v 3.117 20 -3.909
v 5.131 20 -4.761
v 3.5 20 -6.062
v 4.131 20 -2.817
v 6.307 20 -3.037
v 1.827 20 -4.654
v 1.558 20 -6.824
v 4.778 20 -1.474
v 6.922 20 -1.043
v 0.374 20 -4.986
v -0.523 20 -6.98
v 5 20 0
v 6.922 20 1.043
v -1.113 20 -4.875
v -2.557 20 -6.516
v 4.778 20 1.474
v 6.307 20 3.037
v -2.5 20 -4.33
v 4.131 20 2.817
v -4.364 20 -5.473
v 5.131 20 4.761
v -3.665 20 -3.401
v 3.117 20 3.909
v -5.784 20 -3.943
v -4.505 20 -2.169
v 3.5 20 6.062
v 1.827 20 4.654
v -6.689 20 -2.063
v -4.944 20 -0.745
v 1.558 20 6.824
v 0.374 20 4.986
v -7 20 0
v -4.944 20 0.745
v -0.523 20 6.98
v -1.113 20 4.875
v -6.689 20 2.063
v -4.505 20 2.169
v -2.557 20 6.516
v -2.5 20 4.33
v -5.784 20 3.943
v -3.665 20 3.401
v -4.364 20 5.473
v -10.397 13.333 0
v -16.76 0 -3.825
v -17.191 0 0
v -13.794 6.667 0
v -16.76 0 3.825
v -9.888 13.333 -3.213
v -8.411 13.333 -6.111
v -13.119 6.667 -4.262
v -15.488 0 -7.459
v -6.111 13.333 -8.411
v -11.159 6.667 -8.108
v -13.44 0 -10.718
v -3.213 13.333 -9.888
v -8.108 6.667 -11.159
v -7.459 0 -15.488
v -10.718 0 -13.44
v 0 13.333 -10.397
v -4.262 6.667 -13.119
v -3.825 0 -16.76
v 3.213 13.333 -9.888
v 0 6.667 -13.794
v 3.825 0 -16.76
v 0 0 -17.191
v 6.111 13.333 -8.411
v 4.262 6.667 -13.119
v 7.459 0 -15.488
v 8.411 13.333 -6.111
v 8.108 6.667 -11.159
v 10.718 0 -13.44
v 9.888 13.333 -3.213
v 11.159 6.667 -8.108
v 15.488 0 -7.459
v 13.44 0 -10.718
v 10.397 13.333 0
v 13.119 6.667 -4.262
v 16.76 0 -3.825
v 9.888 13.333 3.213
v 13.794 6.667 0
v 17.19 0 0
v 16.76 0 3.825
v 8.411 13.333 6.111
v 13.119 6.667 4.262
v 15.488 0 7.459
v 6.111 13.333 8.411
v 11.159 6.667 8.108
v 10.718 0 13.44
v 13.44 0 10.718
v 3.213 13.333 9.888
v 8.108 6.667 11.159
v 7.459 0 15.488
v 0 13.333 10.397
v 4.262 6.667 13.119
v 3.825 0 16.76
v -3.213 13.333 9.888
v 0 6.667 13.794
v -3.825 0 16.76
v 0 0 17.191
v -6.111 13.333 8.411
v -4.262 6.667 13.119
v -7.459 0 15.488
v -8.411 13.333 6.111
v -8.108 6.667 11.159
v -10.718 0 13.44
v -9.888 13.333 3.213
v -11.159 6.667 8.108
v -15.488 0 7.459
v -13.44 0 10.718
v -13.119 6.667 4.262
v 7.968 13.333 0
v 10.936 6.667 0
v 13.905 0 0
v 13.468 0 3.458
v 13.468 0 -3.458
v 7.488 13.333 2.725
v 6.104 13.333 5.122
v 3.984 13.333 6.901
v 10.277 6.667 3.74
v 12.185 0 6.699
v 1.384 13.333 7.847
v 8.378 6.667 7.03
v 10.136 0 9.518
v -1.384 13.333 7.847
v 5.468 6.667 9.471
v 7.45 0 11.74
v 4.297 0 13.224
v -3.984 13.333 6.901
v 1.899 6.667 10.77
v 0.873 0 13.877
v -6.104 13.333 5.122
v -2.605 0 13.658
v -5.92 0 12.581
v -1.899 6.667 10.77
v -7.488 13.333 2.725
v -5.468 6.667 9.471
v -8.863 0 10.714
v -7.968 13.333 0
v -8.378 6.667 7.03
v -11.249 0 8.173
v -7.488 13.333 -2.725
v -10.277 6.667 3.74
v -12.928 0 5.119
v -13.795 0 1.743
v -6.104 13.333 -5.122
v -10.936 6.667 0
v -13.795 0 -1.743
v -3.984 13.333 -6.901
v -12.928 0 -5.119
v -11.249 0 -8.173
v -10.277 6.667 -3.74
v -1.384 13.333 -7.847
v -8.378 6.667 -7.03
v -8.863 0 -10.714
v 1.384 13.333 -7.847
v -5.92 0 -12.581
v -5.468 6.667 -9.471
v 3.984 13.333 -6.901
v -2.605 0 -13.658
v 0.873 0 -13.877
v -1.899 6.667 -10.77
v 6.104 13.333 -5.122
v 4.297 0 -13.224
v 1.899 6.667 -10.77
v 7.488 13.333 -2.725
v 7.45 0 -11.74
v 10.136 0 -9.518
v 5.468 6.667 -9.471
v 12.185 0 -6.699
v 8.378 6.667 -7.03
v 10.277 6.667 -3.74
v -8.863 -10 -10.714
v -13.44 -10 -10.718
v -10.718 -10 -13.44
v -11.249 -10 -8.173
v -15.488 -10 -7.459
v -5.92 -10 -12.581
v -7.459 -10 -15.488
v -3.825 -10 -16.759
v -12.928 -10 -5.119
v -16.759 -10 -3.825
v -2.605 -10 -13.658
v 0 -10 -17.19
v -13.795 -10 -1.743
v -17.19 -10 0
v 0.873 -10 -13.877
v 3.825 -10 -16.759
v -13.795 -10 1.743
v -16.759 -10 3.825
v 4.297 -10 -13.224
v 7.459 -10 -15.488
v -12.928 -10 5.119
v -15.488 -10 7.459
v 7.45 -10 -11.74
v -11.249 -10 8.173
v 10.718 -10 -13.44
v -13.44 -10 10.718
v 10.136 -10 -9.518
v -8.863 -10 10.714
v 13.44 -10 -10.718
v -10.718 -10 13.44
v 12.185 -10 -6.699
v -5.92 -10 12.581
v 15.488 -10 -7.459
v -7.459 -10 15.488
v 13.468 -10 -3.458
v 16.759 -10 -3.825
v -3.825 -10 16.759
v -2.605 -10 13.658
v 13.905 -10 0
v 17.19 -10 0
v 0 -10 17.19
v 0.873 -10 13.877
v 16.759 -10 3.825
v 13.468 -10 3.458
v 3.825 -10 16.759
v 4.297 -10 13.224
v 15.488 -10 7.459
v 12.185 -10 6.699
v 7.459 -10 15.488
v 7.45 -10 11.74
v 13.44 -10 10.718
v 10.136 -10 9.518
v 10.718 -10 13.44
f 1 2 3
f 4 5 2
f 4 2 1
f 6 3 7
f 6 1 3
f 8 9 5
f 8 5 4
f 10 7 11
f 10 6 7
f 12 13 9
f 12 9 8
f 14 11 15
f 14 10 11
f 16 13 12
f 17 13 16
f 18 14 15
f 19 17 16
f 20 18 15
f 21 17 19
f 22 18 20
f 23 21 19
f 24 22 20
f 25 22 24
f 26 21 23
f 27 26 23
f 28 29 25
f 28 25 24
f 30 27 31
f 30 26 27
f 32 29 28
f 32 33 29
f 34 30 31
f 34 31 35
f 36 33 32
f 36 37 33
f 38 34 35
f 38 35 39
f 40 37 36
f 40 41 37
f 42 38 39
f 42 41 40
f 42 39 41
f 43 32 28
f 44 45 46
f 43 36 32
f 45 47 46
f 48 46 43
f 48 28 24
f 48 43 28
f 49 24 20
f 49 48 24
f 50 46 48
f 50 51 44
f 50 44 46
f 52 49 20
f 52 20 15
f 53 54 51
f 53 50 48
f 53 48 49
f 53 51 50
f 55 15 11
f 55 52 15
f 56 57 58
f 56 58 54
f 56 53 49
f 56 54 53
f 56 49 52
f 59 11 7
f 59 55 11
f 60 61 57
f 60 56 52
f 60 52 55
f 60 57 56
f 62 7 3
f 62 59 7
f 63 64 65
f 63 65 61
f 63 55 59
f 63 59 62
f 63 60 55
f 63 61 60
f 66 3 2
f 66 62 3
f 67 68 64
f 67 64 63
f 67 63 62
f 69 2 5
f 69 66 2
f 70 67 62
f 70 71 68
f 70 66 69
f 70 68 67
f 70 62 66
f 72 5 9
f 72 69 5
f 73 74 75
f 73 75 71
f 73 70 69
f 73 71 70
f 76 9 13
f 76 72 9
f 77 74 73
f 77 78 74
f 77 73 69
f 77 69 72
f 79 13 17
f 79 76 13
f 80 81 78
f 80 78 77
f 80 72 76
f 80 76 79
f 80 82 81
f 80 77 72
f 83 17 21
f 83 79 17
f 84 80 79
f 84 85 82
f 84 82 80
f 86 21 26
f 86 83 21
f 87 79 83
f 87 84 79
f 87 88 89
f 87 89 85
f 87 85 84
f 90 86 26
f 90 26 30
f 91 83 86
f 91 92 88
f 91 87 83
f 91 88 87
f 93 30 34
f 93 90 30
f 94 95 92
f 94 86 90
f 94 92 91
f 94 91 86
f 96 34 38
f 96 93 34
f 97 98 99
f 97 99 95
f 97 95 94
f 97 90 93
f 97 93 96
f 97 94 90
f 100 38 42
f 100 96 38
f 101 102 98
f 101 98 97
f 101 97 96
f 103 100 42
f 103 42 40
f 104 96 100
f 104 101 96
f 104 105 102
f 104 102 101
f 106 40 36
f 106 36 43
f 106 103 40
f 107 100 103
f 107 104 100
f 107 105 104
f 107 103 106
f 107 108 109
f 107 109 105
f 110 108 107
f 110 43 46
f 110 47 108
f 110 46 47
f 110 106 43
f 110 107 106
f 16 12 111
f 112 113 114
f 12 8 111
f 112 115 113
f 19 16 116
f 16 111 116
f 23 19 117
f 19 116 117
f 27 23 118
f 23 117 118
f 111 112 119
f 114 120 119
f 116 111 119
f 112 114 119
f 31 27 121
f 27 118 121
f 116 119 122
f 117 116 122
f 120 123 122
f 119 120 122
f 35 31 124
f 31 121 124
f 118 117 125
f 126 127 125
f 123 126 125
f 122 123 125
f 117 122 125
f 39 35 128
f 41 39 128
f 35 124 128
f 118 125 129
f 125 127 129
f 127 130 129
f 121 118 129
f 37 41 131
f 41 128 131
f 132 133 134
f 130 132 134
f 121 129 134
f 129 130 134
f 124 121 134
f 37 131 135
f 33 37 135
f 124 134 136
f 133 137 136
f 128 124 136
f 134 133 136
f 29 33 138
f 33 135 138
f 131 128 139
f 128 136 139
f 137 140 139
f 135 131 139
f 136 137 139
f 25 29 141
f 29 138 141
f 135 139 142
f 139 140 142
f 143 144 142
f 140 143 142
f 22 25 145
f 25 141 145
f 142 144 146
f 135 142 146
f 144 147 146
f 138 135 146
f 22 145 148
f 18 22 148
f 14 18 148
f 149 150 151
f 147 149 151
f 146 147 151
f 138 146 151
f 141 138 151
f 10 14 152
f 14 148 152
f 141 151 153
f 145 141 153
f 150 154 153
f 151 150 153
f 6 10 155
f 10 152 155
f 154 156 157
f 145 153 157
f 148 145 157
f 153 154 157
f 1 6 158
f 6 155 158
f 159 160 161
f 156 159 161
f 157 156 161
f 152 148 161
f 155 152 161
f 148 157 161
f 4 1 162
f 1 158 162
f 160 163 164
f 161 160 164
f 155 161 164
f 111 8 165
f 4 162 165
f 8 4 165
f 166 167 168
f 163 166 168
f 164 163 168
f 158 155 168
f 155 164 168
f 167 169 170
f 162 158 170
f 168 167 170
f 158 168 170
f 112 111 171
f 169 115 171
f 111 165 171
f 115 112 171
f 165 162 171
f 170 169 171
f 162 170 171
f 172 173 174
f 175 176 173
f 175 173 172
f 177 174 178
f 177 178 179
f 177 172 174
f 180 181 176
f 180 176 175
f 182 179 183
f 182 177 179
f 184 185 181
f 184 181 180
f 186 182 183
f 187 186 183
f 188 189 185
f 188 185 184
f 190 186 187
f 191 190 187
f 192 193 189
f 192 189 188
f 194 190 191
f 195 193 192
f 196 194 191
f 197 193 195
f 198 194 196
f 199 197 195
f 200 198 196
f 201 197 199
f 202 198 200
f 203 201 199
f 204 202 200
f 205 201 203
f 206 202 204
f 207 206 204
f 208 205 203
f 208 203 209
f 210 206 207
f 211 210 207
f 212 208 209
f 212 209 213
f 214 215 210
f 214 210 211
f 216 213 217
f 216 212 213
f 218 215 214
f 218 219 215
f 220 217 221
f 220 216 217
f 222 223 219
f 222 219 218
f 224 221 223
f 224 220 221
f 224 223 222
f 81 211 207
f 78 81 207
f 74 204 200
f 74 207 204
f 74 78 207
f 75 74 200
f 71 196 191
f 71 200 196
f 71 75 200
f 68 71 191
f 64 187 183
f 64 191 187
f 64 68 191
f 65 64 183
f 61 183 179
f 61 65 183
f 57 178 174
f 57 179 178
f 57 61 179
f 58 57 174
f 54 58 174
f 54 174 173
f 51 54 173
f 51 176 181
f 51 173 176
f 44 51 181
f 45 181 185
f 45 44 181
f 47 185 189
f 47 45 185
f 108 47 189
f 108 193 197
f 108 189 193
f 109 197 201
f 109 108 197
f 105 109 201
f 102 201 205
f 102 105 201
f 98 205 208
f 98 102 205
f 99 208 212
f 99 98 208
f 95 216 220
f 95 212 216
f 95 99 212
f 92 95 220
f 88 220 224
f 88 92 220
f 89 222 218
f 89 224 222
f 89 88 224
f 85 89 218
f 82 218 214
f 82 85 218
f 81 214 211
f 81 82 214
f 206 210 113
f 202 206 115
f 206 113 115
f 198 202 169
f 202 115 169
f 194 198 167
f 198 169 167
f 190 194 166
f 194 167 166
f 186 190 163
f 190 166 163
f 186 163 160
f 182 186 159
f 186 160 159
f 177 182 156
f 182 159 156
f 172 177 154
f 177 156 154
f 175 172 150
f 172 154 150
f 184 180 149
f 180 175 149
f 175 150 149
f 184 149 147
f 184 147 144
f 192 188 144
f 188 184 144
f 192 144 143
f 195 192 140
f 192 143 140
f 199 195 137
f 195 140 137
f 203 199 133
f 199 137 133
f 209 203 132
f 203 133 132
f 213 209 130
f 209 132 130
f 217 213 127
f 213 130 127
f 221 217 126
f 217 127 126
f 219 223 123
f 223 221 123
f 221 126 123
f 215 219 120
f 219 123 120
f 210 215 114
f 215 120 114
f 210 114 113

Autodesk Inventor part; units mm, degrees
ref_plane "YZ Plane" through (0, 0, 0) normal (1, 0, 0) x (0, 1, 0)
ref_plane "XZ Plane" through (0, 0, 0) normal (0, 1, 0) x (-1, 0, 0)
ref_plane "XY Plane" through (0, 0, 0) normal (0, 0, 1) x (1, 0, 0)
sketch "Boceto2" plane through (0, 0, 0) normal (0, 0, 1) x (1, 0, 0)
  line L0 (0, 0) -> (0, 20)
  dimension "d2" = 20
ref_plane "Plano de trabajo1" through (0, 20, 0) normal (0, 1, 0) x (-1, 0, 0)
sketch "Boceto4" plane through (0, 20, 0) normal (0, 1, 0) x (-1, 0, 0)
  circle A0 centre (0, 0) radius 5
  circle A1 centre (0, 0) radius 7
  dimension "d13" = 10
  dimension "d14" = 14
extrude "Extrusión1" add sketch "Boceto4" against normal blind 20 draft 27
sketch "Boceto7" plane through (0, 20, 0) normal (0, 1, 0) x (1, 0, 0)
  circle A0 centre (0, 0) radius 7 projected
  circle A1 centre (0, 0) radius 5
extrude "Extrusión2" cut sketch "Boceto7" against normal blind 20 draft 24 contours A1
sketch "Boceto9" plane through (0, 0, 0) normal (0, -1, 0) x (1, 0, 0)
  circle A0 centre (0, 0) radius 13.9046 projected
  circle A1 centre (0, 0) radius 13.9046
  circle A2 centre (0, 0) radius 17.1905
extrude "Extrusión3" add sketch "Boceto9" along normal blind 10
properties part number "Boquilla"
